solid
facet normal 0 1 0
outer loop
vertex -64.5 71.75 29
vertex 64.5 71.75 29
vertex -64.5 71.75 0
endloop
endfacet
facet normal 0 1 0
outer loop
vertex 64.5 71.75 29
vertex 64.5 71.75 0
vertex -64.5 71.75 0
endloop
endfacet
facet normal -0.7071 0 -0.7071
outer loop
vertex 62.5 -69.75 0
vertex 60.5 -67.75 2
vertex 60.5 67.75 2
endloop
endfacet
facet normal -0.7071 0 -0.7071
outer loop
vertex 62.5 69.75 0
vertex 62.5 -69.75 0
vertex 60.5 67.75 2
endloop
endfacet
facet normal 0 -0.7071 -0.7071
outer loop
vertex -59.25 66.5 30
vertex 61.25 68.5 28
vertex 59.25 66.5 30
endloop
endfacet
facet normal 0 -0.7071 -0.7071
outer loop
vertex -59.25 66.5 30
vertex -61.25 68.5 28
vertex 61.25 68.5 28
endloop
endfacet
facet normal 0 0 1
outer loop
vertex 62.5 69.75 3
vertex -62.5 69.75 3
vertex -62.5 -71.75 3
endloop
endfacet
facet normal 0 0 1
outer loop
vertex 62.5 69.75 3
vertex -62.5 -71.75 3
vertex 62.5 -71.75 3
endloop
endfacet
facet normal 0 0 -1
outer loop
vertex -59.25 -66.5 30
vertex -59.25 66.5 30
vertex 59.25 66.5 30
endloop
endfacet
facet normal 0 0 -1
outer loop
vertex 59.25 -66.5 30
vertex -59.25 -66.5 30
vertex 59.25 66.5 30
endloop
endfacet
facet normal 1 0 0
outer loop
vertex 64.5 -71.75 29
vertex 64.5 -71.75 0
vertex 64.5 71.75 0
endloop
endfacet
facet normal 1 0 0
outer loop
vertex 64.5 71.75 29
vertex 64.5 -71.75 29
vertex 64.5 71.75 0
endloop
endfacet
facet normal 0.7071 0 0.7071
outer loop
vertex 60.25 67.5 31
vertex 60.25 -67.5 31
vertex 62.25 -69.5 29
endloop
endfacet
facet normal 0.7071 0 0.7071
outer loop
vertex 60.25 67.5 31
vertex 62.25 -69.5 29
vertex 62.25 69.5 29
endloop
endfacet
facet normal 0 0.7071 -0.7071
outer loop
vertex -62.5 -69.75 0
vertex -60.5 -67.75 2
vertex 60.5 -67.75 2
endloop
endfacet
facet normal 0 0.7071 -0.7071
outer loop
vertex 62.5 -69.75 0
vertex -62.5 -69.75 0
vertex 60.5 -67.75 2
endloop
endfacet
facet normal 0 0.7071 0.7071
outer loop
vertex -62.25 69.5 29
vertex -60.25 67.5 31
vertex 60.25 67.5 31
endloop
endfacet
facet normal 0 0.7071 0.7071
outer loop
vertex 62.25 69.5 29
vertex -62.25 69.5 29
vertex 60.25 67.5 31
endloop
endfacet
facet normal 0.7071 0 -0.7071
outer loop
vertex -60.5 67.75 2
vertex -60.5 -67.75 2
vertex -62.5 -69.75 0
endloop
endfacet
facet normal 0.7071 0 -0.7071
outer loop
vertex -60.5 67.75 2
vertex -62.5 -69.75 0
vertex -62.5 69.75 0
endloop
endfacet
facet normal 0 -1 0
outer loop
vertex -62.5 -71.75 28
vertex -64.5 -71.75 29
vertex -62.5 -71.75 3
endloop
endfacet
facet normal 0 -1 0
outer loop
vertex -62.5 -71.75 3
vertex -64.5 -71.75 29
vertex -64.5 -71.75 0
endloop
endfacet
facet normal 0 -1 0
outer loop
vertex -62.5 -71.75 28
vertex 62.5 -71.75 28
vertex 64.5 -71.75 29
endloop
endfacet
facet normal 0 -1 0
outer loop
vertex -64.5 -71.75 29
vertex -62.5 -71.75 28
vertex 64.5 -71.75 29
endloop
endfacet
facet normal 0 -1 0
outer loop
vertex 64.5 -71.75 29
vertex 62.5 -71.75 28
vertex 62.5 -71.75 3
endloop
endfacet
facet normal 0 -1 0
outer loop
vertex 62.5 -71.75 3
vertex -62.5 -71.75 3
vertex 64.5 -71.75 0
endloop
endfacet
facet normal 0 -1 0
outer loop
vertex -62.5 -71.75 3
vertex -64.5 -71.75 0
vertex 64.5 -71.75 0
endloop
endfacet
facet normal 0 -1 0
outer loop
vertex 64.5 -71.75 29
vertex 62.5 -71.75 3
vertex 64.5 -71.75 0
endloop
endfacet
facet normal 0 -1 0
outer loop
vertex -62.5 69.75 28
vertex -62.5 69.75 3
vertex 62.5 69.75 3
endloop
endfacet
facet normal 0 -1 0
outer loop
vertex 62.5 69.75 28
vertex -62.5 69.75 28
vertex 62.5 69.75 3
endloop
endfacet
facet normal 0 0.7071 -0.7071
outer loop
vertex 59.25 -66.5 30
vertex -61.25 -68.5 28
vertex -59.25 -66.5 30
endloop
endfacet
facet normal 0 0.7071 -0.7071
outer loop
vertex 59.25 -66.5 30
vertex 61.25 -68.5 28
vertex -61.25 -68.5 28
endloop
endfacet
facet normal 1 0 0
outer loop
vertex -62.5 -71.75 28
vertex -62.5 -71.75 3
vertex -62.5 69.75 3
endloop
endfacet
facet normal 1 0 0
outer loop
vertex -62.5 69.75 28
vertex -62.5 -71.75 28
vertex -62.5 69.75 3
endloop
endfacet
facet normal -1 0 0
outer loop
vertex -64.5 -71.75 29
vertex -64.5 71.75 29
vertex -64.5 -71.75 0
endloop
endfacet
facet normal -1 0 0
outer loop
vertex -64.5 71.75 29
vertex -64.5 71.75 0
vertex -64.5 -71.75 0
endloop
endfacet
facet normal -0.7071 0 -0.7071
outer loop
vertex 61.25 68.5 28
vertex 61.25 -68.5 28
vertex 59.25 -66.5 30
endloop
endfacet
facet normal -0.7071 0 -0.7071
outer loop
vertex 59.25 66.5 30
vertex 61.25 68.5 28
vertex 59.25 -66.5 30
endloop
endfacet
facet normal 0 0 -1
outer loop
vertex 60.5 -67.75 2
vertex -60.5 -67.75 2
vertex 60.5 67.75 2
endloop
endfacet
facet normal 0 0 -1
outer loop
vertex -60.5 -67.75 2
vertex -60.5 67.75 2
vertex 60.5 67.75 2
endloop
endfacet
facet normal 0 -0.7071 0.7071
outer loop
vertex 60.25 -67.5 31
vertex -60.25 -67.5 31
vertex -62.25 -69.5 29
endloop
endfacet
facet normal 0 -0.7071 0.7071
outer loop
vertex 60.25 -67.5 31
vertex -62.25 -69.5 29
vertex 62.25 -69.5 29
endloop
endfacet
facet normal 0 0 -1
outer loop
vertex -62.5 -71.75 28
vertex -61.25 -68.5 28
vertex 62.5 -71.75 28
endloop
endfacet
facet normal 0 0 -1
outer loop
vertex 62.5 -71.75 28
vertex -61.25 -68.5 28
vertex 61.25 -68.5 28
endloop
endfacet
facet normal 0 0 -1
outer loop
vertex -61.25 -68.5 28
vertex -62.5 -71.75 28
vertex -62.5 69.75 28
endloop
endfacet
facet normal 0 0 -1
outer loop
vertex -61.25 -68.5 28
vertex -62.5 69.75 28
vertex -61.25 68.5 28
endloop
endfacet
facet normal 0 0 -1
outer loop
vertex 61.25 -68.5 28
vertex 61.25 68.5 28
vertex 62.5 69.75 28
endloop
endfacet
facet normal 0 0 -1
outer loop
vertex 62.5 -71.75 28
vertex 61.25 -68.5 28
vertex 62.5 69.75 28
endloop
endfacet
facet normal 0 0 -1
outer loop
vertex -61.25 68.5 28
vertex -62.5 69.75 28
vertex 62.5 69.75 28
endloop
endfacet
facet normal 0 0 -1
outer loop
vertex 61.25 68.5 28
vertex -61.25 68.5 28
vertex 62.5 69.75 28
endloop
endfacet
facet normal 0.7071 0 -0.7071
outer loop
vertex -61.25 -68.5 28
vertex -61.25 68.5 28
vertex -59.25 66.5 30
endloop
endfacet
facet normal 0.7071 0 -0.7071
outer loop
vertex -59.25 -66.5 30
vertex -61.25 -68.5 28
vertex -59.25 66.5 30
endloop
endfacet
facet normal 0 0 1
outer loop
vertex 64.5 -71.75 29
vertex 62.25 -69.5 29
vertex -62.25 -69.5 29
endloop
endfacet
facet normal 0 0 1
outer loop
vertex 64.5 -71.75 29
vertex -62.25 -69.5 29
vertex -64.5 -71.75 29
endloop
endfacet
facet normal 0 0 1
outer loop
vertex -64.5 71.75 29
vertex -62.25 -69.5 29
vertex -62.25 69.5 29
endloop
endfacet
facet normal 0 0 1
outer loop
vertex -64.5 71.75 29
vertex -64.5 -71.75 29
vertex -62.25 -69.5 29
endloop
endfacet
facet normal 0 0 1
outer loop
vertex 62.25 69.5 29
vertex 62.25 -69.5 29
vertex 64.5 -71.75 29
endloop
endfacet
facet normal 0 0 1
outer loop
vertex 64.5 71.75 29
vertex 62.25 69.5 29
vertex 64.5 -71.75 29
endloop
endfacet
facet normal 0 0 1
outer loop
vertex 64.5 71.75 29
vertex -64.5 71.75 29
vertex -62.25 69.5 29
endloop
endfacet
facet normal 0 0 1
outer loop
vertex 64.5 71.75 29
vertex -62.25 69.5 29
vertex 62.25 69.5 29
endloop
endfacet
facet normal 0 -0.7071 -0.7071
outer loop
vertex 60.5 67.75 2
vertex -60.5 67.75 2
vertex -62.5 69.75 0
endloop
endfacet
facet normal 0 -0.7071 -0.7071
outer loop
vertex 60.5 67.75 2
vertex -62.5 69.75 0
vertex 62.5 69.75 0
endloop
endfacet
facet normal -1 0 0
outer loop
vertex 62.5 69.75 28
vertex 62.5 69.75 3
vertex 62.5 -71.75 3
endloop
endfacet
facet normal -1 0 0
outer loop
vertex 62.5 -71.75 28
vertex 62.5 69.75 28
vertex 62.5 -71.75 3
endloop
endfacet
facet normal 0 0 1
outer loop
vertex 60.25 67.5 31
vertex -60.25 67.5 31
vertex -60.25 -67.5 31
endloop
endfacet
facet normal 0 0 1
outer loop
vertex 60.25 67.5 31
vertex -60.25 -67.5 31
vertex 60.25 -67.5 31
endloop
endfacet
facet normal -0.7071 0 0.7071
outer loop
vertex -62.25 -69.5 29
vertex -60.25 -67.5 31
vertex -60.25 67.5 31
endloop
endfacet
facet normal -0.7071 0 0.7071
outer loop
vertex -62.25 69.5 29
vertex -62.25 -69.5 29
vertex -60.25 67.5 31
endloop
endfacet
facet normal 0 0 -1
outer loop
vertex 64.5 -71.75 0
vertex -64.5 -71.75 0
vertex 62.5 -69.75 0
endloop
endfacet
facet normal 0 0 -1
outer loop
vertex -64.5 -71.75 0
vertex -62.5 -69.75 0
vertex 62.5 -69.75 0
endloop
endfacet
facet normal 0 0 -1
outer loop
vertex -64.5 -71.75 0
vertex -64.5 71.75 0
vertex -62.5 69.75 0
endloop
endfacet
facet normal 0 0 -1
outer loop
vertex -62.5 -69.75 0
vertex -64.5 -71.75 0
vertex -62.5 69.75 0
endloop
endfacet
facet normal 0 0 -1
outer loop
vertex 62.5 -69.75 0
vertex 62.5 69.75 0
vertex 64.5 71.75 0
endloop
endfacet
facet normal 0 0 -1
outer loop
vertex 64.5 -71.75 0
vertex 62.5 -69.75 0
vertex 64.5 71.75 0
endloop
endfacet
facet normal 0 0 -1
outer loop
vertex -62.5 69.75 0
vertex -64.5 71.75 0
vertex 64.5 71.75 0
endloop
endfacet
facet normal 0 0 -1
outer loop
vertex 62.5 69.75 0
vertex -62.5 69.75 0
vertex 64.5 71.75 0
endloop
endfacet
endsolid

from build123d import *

# Parameters (mm, degrees)
F0_W      = 129
F0_H      = 143.5
F0_W_2    = 125
F0_H_2    = 139.5
F1_DEPTH  = 3
F2_DEPTH  = 2
F3_SIZE   = 1.99999
F5_DEPTH  = 25
F6_W      = 125
F6_H      = 141.5
F6_W_2    = 124.5
F6_H_2    = 139
F6_W_3    = 122.5
F6_H_3    = 137
F7_DEPTH  = 1
F8_DEPTH  = 3
F9_SIZE   = 1.99999
F10_DEPTH = 2
F10_TAPER = 45


# Not quite as in the source:
# - a fillet or chamfer is up to 0.001 mm smaller than in the source, because OpenCascade refuses the exact size
# - a feature names something its author has since deleted; it is built from what else it names


with BuildPart() as f1:
    # F0 (on Top) → F1 (new body)
    with BuildSketch(Plane.XY):
        Rectangle(F0_W, F0_H)
        Rectangle(F0_W_2, F0_H_2, mode=Mode.SUBTRACT)
        Rectangle(F0_W_2, F0_H_2)
    extrude(amount=F1_DEPTH)

    # F0 (on Top) → F2 (cut)
    with BuildSketch(Plane.XY):
        Rectangle(F0_W_2, F0_H_2)
    extrude(amount=F2_DEPTH, mode=Mode.SUBTRACT)

    # F3 (size 2 in the source; OpenCascade refuses exactly that, so slightly less here)
    f3_edges = [f1.edges().sort_by_distance(p)[0] for p in [
        (0, -69.75, 2),
        (62.5, 0, 2),
        (0, 69.75, 2),
        (-62.5, 0, 2),
    ]]
    chamfer(f3_edges, length=F3_SIZE)

    # F4 (on face) → F5 (join)
    with BuildSketch(Plane.XY.offset(3)):
        Polygon((-64.5, 71.75), (-64.5, -71.75), (-62.5, -71.75), (-62.5, 69.75), (62.5, 69.75), (62.5, -71.75), (64.5, -71.75), (64.5, 71.75), align=None)
    extrude(amount=F5_DEPTH)

    # F6 (on face) → F7 (join)
    with BuildSketch(Plane.XY.offset(28)):
        with Locations((0, -1)):
            Rectangle(F6_W, F6_H)
        Rectangle(F6_W_2, F6_H_2, mode=Mode.SUBTRACT)
        Rectangle(F6_W_2, F6_H_2)
        Rectangle(F6_W_3, F6_H_3, mode=Mode.SUBTRACT)
        Rectangle(F6_W_3, F6_H_3)
        Polygon((-64.5, 71.75), (-64.5, -71.75), (-62.5, -71.75), (-62.5, 69.75), (62.5, 69.75), (62.5, -71.75), (64.5, -71.75), (64.5, 71.75), align=None)
    extrude(amount=F7_DEPTH)

    # F6 (on face) → F8 (join)
    with BuildSketch(Plane.XY.offset(28)):
        Rectangle(F6_W_2, F6_H_2)
        Rectangle(F6_W_3, F6_H_3, mode=Mode.SUBTRACT)
        Rectangle(F6_W_3, F6_H_3)
    extrude(amount=F8_DEPTH)

    # F9 (size 2 in the source; OpenCascade refuses exactly that, so slightly less here)
    f9_edges = [f1.edges().sort_by_distance(p)[0] for p in [
        (-62.25, 0, 31),
        (0, 69.5, 31),
        (0, -69.5, 31),
        (62.25, 0, 31),
    ]]
    chamfer(f9_edges, length=F9_SIZE)

    # F6 (on face) → F10 (cut)
    with BuildSketch(Plane.XY.offset(28)):
        Rectangle(F6_W_3, F6_H_3)
    extrude(amount=F10_DEPTH, taper=F10_TAPER, mode=Mode.SUBTRACT)


solid = f1.part
